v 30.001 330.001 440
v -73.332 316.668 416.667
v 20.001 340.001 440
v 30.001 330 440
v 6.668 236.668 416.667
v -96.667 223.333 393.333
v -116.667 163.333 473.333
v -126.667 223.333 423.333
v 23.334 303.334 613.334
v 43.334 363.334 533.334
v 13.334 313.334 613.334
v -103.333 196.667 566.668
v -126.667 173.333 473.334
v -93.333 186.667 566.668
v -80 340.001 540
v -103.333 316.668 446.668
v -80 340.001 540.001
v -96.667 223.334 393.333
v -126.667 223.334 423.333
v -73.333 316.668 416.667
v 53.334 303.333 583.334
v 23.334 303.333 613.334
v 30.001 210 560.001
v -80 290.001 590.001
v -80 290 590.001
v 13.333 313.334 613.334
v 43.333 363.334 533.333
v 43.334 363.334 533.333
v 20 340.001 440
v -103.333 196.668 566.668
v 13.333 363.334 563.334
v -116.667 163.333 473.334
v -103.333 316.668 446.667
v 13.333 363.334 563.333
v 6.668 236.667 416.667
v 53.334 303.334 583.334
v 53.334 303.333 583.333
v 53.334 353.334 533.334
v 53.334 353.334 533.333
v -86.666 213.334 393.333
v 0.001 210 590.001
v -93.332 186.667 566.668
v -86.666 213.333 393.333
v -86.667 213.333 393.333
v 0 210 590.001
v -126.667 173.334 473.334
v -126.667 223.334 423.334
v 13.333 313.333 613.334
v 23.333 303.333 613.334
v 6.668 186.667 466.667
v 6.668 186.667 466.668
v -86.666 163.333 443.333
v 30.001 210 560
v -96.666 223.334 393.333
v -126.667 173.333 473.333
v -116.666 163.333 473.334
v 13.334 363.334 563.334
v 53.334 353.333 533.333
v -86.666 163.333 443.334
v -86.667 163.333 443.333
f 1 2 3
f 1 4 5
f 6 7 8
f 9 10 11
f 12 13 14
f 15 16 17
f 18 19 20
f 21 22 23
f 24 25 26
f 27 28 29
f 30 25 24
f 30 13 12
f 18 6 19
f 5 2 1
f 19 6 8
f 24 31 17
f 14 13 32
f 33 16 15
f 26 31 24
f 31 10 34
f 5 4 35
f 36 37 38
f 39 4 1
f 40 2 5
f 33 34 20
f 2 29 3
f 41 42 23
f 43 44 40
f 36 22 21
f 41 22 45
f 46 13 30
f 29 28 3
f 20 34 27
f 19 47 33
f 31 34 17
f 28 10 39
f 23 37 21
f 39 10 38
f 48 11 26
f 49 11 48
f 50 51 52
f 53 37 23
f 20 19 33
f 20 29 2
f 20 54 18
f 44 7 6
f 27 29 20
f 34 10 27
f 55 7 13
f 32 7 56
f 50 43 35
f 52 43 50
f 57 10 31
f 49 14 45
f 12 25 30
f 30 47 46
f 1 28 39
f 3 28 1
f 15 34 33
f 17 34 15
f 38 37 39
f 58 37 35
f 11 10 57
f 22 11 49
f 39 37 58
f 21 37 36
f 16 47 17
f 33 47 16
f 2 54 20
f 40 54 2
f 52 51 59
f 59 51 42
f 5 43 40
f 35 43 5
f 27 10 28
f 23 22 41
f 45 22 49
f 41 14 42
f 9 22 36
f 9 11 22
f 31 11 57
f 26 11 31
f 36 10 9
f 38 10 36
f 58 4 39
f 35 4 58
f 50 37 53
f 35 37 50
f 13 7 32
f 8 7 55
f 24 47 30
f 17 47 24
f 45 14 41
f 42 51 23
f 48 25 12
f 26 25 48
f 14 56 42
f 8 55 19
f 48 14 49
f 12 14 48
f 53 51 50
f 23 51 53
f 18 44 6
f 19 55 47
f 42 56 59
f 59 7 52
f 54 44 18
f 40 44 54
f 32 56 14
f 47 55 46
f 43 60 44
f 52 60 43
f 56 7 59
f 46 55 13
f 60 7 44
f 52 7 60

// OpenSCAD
module convex_poly(l) {
     hull() { for (point=l) translate (point) cube(0.0001); }
};

// compute the sum of a list of vectors
function sum_vects(l) = (len(l) == 0) ? [0,0,0] :
     sum_vects([for (i = [0:1:len(l)-2]) l[i]]) + l[len(l)-1];

metasylv = [[26, 56, 86, 116],
 [26, 56, 93, 109],
 [26, 61, 81, 116],
 [37, 67, 85, 95],
 [37, 67, 78, 102],
 [26, 63, 93, 102],
 [26, 68, 81, 109],
 [26, 68, 88, 102],
 [27, 55, 86, 116],
 [27, 55, 93, 109],
 [37, 62, 90, 95],
 [37, 60, 78, 109],
 [29, 61, 78, 116],
 [37, 55, 90, 102],
 [29, 68, 78, 109],
 [37, 55, 83, 109],
 [30, 55, 83, 116],
 [36, 68, 85, 95],
 [30, 60, 78, 116],
 [36, 68, 78, 102],
 [34, 62, 93, 95],
 [34, 55, 93, 102],
 [33, 68, 88, 95],
 [33, 63, 93, 95]];



// projection matrix 4D -> 3D
projmatrix = [[1, 0, 0], [0, 1, 0], [0, 0, 1], [-1/3, -1/3, -1/3]];

scale(10) convex_poly([for (p=metasylv) p * projmatrix]);
